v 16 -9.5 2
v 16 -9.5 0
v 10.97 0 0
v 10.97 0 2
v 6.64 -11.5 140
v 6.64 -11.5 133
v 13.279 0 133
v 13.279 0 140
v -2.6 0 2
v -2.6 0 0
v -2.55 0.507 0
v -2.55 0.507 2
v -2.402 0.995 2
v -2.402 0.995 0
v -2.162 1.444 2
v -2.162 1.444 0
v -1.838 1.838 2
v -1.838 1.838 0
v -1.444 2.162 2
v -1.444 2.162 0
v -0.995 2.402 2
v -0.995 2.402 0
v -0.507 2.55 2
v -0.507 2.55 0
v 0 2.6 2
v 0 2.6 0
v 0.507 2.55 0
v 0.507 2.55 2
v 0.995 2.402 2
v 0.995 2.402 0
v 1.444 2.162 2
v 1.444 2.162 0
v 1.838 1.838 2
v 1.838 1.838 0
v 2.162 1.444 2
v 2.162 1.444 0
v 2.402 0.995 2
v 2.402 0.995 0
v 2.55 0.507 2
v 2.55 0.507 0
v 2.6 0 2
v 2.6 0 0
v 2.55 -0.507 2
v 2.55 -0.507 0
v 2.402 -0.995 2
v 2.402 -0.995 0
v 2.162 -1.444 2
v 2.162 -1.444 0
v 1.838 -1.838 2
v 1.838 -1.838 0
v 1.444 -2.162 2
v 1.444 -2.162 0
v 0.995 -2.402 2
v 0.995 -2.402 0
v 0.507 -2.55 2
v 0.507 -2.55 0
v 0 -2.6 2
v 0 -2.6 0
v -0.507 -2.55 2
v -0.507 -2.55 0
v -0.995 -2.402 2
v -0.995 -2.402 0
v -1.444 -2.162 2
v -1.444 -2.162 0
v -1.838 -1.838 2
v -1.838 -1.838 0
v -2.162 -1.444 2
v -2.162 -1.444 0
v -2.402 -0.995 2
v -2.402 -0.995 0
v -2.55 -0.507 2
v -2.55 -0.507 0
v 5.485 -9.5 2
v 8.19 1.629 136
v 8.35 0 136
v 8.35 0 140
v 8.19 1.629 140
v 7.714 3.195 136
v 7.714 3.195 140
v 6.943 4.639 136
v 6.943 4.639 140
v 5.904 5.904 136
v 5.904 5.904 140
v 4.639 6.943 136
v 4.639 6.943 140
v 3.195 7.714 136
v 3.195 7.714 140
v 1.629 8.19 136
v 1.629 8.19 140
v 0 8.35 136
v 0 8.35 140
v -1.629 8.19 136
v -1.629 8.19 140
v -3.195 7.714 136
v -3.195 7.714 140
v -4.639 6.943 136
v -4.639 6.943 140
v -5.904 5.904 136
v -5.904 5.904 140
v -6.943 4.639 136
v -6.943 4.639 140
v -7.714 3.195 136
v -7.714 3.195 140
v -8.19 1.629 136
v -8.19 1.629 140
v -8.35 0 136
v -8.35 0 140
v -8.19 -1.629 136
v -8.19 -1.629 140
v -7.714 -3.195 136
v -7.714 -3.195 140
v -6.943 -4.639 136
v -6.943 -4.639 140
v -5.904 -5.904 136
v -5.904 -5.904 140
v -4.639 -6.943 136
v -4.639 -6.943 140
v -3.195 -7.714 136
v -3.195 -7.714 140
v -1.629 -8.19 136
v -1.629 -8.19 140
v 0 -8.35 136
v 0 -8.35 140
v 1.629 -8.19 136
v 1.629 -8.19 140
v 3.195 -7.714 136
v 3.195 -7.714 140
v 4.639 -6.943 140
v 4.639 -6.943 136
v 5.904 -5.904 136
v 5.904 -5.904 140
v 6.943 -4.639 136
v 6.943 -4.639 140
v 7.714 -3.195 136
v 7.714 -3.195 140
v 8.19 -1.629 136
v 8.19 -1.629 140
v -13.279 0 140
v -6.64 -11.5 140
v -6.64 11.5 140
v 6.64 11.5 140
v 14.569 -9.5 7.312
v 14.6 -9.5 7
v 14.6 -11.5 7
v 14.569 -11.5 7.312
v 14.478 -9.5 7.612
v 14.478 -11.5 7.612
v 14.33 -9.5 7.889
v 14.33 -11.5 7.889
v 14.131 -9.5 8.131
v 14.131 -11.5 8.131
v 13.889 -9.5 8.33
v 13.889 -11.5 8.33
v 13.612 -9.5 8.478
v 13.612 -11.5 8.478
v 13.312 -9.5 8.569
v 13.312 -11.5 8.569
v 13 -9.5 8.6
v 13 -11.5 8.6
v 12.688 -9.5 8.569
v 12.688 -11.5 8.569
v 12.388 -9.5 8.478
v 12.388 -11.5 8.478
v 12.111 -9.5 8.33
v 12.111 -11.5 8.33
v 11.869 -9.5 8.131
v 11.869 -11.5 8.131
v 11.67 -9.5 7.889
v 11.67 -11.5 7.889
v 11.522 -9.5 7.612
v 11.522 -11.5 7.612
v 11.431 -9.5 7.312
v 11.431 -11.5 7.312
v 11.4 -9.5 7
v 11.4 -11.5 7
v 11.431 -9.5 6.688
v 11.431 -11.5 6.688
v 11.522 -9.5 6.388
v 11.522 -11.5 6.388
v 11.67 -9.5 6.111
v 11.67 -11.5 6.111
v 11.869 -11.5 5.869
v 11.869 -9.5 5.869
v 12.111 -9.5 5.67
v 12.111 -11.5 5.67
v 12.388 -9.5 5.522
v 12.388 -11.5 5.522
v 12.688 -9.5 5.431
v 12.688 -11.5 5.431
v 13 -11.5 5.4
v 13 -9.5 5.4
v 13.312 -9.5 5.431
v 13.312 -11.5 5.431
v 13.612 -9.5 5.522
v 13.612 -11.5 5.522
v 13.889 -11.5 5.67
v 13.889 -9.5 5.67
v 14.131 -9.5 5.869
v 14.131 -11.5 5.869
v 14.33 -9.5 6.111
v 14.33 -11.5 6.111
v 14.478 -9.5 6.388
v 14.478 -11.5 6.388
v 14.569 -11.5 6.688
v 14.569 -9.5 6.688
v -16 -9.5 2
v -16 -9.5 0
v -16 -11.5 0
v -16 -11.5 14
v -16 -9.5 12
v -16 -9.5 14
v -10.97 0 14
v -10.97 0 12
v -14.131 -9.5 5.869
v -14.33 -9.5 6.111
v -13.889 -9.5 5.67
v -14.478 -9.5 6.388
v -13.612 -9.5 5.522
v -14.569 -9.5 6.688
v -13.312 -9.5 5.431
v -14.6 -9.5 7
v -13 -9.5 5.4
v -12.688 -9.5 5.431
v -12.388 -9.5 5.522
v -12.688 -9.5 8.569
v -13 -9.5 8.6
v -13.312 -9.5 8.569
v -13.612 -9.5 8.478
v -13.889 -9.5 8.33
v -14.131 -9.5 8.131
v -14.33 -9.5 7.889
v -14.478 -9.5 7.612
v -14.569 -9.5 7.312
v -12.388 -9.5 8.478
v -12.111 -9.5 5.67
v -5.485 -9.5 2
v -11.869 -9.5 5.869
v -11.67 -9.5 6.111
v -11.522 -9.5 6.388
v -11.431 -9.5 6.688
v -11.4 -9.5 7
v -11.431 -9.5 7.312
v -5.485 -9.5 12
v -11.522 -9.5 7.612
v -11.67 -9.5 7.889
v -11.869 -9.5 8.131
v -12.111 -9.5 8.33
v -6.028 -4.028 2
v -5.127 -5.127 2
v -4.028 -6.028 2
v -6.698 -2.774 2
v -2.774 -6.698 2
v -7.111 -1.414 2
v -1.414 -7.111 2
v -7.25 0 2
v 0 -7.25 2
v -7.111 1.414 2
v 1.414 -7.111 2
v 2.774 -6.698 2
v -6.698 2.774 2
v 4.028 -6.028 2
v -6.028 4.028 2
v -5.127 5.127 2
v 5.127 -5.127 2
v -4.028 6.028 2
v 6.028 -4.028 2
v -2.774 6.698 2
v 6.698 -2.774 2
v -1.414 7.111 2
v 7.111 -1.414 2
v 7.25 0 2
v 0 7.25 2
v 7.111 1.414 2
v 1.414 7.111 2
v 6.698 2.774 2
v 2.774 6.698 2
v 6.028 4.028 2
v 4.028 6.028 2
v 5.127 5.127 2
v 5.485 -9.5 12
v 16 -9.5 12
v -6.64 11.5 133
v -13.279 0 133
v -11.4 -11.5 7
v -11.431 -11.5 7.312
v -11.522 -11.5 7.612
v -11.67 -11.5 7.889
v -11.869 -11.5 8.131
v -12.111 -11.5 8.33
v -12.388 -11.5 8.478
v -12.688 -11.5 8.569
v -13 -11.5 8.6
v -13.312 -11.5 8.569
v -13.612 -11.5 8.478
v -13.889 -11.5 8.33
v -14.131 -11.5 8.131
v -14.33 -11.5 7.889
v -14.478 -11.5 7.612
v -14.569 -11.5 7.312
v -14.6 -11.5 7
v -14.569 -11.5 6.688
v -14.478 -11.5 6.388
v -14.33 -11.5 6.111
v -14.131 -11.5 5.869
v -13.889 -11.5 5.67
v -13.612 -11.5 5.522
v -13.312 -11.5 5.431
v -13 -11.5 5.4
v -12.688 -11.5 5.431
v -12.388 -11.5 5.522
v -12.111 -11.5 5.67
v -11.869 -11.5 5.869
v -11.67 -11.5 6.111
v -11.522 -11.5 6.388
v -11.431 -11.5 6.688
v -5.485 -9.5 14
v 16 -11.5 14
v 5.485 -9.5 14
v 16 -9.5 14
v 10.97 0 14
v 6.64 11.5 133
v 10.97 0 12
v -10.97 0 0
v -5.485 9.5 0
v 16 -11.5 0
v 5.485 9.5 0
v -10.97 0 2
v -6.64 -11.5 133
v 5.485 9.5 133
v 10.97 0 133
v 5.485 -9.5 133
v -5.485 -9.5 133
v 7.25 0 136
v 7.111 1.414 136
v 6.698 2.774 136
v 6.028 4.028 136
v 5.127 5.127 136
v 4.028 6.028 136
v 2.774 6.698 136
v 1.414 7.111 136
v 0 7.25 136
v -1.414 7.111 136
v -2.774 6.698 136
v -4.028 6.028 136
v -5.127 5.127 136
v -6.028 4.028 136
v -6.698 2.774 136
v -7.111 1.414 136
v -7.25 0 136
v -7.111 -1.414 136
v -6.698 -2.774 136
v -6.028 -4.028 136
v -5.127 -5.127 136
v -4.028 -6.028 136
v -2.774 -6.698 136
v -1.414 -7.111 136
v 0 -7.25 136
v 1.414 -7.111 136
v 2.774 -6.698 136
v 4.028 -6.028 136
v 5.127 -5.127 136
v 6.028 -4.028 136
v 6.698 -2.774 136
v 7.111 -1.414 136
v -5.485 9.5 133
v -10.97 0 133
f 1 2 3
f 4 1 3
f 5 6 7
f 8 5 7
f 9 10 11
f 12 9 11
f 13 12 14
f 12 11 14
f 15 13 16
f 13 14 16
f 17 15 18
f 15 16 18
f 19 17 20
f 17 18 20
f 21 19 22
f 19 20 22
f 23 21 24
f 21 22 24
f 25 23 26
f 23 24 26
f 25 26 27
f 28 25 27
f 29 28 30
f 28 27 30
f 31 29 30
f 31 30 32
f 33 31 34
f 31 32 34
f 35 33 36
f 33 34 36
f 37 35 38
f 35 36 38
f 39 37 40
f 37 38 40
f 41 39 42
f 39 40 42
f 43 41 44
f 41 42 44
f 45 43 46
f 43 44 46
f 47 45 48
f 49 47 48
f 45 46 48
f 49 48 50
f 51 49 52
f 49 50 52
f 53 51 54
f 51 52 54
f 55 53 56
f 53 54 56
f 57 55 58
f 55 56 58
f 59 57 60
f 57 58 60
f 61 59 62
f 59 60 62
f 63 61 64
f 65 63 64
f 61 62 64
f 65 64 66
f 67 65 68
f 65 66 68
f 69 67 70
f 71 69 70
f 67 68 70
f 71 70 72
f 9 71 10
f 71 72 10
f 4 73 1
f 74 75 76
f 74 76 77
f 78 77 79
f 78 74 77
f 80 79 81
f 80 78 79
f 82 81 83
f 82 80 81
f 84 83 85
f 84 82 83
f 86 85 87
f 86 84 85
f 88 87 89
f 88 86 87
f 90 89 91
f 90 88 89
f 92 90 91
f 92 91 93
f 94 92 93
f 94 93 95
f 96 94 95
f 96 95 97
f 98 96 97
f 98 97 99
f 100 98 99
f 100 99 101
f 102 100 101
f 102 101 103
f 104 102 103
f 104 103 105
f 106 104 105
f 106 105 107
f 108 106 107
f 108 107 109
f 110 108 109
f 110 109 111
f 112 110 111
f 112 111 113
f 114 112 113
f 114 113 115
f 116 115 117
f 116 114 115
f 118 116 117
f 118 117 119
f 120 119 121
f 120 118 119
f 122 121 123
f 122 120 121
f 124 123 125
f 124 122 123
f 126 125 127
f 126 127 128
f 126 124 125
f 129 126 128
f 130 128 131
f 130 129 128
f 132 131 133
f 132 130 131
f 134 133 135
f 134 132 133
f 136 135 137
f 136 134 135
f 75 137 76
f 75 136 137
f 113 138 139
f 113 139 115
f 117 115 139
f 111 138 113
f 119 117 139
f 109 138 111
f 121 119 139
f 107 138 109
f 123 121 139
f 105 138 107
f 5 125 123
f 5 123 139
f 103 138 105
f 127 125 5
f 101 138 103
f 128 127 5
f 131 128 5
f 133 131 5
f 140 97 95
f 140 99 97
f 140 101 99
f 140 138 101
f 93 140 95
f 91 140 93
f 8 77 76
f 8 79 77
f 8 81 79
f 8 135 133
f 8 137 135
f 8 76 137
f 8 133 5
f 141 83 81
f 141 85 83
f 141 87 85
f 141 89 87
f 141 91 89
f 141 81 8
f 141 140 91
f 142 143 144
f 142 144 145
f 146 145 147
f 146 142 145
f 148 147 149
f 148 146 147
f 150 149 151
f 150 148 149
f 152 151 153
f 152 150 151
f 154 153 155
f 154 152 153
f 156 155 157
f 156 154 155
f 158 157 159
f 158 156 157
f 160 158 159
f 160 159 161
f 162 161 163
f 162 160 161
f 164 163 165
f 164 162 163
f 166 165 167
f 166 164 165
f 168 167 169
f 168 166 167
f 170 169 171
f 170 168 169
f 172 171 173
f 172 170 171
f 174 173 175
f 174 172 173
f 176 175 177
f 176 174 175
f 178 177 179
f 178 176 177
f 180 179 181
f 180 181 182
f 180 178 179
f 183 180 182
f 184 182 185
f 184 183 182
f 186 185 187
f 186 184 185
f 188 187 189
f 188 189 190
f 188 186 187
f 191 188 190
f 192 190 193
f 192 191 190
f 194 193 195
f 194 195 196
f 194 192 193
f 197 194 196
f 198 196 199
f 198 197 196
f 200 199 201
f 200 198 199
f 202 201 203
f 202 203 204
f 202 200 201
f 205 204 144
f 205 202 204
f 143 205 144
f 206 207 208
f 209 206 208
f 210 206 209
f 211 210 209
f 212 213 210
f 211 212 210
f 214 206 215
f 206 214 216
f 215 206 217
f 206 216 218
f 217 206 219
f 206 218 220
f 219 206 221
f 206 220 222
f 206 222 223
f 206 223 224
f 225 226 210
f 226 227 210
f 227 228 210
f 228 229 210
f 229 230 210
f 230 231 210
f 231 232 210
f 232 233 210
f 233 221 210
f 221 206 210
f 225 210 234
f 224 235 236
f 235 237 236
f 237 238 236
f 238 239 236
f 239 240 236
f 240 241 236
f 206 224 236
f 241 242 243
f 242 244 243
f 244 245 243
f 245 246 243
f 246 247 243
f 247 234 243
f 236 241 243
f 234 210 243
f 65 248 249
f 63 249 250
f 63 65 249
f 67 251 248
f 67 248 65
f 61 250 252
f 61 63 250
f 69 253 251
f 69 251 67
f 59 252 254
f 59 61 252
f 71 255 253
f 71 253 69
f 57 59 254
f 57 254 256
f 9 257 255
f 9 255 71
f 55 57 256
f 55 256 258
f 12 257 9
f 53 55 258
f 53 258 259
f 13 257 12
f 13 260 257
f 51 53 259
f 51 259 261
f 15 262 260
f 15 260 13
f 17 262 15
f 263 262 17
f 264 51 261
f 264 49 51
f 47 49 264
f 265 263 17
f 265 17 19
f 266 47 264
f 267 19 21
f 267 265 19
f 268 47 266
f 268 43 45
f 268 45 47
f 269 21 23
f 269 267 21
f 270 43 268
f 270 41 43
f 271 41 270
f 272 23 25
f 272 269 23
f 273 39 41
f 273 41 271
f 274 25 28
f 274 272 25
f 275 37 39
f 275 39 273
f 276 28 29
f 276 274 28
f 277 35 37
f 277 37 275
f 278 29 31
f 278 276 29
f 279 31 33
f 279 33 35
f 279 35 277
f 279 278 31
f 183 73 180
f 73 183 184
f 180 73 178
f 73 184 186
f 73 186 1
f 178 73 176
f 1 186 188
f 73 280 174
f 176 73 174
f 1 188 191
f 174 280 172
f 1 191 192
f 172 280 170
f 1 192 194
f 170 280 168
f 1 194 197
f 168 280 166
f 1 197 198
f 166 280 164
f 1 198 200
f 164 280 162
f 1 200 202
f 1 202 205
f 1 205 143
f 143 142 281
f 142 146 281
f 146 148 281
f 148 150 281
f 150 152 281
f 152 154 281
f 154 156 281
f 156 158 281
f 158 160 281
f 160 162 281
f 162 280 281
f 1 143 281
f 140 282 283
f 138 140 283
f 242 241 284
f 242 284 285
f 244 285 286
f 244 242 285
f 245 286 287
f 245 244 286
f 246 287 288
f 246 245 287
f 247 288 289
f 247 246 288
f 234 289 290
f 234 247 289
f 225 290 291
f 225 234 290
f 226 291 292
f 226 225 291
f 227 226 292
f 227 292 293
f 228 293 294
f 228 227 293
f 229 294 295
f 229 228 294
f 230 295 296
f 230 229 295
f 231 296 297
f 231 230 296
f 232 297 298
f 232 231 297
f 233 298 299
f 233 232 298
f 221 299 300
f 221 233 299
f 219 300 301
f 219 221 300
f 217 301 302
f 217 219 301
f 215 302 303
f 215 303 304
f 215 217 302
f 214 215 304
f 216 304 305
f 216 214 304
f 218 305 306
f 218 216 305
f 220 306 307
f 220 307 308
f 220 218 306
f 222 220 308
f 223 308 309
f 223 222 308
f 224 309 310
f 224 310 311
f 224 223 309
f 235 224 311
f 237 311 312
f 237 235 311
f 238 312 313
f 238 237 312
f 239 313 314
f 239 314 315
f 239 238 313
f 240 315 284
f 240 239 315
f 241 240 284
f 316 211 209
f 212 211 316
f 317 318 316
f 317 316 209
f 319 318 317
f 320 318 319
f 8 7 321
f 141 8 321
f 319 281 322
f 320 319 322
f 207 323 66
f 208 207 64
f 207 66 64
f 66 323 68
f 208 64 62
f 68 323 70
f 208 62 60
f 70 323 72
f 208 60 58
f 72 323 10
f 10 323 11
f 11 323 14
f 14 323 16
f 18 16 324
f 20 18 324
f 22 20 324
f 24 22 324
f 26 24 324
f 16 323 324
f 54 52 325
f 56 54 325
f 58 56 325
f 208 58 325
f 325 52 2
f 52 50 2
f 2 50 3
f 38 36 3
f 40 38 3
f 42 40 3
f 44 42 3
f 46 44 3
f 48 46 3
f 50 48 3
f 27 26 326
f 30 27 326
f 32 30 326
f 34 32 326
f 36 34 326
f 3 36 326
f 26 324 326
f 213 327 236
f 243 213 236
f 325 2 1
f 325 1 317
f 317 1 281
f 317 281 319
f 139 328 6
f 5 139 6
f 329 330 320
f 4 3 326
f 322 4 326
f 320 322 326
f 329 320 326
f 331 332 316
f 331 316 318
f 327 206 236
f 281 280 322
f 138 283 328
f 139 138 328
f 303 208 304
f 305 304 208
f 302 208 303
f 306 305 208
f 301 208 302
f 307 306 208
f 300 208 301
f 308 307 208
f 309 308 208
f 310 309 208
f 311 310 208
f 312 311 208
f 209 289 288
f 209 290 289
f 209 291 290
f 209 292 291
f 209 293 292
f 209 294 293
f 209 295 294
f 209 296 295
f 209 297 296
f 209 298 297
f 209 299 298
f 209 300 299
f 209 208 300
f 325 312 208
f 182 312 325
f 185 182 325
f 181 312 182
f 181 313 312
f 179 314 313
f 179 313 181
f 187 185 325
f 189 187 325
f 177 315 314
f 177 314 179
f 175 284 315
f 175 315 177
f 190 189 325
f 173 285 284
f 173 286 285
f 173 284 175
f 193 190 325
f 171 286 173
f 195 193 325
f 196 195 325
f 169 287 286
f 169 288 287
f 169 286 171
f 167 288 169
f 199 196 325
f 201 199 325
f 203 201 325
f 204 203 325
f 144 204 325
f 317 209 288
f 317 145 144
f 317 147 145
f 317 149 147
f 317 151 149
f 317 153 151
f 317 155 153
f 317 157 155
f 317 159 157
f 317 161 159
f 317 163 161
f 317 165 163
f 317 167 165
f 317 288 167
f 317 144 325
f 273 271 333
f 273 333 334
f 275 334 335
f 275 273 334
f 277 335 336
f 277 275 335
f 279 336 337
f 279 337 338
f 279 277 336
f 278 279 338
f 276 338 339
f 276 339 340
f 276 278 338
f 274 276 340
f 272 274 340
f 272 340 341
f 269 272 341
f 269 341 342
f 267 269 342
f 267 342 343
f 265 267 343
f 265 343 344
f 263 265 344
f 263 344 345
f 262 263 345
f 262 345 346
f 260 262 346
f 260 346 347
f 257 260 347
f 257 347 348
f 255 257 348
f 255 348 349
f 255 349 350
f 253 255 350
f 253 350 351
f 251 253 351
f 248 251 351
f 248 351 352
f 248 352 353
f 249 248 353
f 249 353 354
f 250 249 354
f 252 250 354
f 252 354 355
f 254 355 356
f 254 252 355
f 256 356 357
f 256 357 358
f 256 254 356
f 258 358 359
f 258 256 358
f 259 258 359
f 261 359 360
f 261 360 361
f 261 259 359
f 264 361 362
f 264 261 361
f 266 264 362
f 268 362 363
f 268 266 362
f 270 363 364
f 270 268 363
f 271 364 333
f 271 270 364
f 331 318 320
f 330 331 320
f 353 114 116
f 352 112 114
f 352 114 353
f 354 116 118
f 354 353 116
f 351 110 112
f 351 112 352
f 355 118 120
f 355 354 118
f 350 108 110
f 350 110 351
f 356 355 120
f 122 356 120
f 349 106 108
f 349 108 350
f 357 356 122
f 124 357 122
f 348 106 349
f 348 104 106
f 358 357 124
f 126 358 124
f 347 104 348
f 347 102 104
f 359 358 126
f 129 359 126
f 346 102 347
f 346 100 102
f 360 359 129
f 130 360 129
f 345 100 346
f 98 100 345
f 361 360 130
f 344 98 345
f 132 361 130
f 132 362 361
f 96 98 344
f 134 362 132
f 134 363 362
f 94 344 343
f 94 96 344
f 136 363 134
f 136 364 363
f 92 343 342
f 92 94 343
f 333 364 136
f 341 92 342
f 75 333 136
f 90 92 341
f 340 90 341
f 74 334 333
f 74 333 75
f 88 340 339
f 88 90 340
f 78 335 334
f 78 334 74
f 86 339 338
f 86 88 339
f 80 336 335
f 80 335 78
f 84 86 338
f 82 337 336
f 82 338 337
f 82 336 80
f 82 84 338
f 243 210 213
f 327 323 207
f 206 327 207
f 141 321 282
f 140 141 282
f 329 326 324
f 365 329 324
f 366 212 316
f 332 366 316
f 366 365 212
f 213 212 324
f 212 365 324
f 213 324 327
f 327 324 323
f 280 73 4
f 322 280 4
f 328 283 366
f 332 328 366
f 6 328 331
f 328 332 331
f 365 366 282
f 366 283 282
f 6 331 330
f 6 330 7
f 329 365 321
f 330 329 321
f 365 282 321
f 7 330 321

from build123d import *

# Parameters (mm, degrees)
SKIZZE1_R                        = 7.25
AUFSATZ_LINEAR_AUSTRAGEN1_DEPTH  = 136
SKIZZE2_R                        = 7.25
AUFSATZ_LINEAR_AUSTRAGEN2_DEPTH  = 2
SKIZZE3_R                        = 8.35
AUFSATZ_LINEAR_AUSTRAGEN3_DEPTH  = 7
AUFSATZ_LINEAR_AUSTRAGEN6_DEPTH  = 2
LINEARES_MUSTER3_COUNT           = 2
LINEARES_MUSTER3_PITCH           = 12
SKIZZE12_W                       = 32
SKIZZE12_H                       = 14
SKIZZE12_R                       = 1.6
AUFSATZ_LINEAR_AUSTRAGEN14_DEPTH = 2
SKIZZE14_R                       = 2.6
SCHNITT_LINEAR_AUSTRAGEN1_DEPTH  = 2


with BuildPart() as part:
    # Skizze1 → Aufsatz-Linear austragen1 (new body)
    with BuildSketch(Plane.XY):
        Polygon((-10.969655115, 0), (-5.484827557, -9.5), (5.484827557, -9.5), (10.969655115, 0), (5.484827557, 9.5), (-5.484827557, 9.5), align=None)
        Circle(SKIZZE1_R, mode=Mode.SUBTRACT)
    extrude(amount=AUFSATZ_LINEAR_AUSTRAGEN1_DEPTH)

    # Skizze2 → Aufsatz-Linear austragen2 (add)
    with BuildSketch(Plane.XY):
        Circle(SKIZZE2_R)
    extrude(amount=AUFSATZ_LINEAR_AUSTRAGEN2_DEPTH)

    # Skizze3 → Aufsatz-Linear austragen3 (add)
    with BuildSketch(Plane.XY.offset(133)):
        Polygon((13.279056191, 0), (6.639528096, 11.5), (-6.639528096, 11.5), (-13.279056191, 0), (-6.639528096, -11.5), (6.639528096, -11.5), align=None)
        Circle(SKIZZE3_R, mode=Mode.SUBTRACT)
    extrude(amount=AUFSATZ_LINEAR_AUSTRAGEN3_DEPTH)

    # Skizze7 → Aufsatz-Linear austragen6 (add)
    with BuildSketch(Plane.XY):
        Polygon((10.969655115, 0), (5.484827557, -9.5), (16, -9.5), align=None)
        Polygon((-5.484827557, -9.5), (-10.969655115, 0), (-16, -9.5), align=None)
    aufsatz_linear_austragen6 = extrude(amount=AUFSATZ_LINEAR_AUSTRAGEN6_DEPTH)

    # Lineares Muster3: Aufsatz-Linear austragen6 ×2
    with Locations(*[(0, 0, i * LINEARES_MUSTER3_PITCH) for i in range(1, LINEARES_MUSTER3_COUNT)]):
        add(aufsatz_linear_austragen6)

    # Skizze12 → Aufsatz-Linear austragen14 (add)
    with BuildSketch(Plane.XZ.offset(9.5)):
        with Locations((0, 7)):
            Rectangle(SKIZZE12_W, SKIZZE12_H)
        with Locations((-13, 7)):
            Circle(SKIZZE12_R, mode=Mode.SUBTRACT)
        with Locations((13, 7)):
            Circle(SKIZZE12_R, mode=Mode.SUBTRACT)
    extrude(amount=AUFSATZ_LINEAR_AUSTRAGEN14_DEPTH)

    # Skizze14 → Schnitt-Linear austragen1 (cut)
    with BuildSketch(Plane(origin=(0, 0, 0), x_dir=(-1, 0, 0), z_dir=(0, 0, -1))):
        Circle(SKIZZE14_R)
    extrude(amount=-SCHNITT_LINEAR_AUSTRAGEN1_DEPTH, mode=Mode.SUBTRACT)


solid = part.part
